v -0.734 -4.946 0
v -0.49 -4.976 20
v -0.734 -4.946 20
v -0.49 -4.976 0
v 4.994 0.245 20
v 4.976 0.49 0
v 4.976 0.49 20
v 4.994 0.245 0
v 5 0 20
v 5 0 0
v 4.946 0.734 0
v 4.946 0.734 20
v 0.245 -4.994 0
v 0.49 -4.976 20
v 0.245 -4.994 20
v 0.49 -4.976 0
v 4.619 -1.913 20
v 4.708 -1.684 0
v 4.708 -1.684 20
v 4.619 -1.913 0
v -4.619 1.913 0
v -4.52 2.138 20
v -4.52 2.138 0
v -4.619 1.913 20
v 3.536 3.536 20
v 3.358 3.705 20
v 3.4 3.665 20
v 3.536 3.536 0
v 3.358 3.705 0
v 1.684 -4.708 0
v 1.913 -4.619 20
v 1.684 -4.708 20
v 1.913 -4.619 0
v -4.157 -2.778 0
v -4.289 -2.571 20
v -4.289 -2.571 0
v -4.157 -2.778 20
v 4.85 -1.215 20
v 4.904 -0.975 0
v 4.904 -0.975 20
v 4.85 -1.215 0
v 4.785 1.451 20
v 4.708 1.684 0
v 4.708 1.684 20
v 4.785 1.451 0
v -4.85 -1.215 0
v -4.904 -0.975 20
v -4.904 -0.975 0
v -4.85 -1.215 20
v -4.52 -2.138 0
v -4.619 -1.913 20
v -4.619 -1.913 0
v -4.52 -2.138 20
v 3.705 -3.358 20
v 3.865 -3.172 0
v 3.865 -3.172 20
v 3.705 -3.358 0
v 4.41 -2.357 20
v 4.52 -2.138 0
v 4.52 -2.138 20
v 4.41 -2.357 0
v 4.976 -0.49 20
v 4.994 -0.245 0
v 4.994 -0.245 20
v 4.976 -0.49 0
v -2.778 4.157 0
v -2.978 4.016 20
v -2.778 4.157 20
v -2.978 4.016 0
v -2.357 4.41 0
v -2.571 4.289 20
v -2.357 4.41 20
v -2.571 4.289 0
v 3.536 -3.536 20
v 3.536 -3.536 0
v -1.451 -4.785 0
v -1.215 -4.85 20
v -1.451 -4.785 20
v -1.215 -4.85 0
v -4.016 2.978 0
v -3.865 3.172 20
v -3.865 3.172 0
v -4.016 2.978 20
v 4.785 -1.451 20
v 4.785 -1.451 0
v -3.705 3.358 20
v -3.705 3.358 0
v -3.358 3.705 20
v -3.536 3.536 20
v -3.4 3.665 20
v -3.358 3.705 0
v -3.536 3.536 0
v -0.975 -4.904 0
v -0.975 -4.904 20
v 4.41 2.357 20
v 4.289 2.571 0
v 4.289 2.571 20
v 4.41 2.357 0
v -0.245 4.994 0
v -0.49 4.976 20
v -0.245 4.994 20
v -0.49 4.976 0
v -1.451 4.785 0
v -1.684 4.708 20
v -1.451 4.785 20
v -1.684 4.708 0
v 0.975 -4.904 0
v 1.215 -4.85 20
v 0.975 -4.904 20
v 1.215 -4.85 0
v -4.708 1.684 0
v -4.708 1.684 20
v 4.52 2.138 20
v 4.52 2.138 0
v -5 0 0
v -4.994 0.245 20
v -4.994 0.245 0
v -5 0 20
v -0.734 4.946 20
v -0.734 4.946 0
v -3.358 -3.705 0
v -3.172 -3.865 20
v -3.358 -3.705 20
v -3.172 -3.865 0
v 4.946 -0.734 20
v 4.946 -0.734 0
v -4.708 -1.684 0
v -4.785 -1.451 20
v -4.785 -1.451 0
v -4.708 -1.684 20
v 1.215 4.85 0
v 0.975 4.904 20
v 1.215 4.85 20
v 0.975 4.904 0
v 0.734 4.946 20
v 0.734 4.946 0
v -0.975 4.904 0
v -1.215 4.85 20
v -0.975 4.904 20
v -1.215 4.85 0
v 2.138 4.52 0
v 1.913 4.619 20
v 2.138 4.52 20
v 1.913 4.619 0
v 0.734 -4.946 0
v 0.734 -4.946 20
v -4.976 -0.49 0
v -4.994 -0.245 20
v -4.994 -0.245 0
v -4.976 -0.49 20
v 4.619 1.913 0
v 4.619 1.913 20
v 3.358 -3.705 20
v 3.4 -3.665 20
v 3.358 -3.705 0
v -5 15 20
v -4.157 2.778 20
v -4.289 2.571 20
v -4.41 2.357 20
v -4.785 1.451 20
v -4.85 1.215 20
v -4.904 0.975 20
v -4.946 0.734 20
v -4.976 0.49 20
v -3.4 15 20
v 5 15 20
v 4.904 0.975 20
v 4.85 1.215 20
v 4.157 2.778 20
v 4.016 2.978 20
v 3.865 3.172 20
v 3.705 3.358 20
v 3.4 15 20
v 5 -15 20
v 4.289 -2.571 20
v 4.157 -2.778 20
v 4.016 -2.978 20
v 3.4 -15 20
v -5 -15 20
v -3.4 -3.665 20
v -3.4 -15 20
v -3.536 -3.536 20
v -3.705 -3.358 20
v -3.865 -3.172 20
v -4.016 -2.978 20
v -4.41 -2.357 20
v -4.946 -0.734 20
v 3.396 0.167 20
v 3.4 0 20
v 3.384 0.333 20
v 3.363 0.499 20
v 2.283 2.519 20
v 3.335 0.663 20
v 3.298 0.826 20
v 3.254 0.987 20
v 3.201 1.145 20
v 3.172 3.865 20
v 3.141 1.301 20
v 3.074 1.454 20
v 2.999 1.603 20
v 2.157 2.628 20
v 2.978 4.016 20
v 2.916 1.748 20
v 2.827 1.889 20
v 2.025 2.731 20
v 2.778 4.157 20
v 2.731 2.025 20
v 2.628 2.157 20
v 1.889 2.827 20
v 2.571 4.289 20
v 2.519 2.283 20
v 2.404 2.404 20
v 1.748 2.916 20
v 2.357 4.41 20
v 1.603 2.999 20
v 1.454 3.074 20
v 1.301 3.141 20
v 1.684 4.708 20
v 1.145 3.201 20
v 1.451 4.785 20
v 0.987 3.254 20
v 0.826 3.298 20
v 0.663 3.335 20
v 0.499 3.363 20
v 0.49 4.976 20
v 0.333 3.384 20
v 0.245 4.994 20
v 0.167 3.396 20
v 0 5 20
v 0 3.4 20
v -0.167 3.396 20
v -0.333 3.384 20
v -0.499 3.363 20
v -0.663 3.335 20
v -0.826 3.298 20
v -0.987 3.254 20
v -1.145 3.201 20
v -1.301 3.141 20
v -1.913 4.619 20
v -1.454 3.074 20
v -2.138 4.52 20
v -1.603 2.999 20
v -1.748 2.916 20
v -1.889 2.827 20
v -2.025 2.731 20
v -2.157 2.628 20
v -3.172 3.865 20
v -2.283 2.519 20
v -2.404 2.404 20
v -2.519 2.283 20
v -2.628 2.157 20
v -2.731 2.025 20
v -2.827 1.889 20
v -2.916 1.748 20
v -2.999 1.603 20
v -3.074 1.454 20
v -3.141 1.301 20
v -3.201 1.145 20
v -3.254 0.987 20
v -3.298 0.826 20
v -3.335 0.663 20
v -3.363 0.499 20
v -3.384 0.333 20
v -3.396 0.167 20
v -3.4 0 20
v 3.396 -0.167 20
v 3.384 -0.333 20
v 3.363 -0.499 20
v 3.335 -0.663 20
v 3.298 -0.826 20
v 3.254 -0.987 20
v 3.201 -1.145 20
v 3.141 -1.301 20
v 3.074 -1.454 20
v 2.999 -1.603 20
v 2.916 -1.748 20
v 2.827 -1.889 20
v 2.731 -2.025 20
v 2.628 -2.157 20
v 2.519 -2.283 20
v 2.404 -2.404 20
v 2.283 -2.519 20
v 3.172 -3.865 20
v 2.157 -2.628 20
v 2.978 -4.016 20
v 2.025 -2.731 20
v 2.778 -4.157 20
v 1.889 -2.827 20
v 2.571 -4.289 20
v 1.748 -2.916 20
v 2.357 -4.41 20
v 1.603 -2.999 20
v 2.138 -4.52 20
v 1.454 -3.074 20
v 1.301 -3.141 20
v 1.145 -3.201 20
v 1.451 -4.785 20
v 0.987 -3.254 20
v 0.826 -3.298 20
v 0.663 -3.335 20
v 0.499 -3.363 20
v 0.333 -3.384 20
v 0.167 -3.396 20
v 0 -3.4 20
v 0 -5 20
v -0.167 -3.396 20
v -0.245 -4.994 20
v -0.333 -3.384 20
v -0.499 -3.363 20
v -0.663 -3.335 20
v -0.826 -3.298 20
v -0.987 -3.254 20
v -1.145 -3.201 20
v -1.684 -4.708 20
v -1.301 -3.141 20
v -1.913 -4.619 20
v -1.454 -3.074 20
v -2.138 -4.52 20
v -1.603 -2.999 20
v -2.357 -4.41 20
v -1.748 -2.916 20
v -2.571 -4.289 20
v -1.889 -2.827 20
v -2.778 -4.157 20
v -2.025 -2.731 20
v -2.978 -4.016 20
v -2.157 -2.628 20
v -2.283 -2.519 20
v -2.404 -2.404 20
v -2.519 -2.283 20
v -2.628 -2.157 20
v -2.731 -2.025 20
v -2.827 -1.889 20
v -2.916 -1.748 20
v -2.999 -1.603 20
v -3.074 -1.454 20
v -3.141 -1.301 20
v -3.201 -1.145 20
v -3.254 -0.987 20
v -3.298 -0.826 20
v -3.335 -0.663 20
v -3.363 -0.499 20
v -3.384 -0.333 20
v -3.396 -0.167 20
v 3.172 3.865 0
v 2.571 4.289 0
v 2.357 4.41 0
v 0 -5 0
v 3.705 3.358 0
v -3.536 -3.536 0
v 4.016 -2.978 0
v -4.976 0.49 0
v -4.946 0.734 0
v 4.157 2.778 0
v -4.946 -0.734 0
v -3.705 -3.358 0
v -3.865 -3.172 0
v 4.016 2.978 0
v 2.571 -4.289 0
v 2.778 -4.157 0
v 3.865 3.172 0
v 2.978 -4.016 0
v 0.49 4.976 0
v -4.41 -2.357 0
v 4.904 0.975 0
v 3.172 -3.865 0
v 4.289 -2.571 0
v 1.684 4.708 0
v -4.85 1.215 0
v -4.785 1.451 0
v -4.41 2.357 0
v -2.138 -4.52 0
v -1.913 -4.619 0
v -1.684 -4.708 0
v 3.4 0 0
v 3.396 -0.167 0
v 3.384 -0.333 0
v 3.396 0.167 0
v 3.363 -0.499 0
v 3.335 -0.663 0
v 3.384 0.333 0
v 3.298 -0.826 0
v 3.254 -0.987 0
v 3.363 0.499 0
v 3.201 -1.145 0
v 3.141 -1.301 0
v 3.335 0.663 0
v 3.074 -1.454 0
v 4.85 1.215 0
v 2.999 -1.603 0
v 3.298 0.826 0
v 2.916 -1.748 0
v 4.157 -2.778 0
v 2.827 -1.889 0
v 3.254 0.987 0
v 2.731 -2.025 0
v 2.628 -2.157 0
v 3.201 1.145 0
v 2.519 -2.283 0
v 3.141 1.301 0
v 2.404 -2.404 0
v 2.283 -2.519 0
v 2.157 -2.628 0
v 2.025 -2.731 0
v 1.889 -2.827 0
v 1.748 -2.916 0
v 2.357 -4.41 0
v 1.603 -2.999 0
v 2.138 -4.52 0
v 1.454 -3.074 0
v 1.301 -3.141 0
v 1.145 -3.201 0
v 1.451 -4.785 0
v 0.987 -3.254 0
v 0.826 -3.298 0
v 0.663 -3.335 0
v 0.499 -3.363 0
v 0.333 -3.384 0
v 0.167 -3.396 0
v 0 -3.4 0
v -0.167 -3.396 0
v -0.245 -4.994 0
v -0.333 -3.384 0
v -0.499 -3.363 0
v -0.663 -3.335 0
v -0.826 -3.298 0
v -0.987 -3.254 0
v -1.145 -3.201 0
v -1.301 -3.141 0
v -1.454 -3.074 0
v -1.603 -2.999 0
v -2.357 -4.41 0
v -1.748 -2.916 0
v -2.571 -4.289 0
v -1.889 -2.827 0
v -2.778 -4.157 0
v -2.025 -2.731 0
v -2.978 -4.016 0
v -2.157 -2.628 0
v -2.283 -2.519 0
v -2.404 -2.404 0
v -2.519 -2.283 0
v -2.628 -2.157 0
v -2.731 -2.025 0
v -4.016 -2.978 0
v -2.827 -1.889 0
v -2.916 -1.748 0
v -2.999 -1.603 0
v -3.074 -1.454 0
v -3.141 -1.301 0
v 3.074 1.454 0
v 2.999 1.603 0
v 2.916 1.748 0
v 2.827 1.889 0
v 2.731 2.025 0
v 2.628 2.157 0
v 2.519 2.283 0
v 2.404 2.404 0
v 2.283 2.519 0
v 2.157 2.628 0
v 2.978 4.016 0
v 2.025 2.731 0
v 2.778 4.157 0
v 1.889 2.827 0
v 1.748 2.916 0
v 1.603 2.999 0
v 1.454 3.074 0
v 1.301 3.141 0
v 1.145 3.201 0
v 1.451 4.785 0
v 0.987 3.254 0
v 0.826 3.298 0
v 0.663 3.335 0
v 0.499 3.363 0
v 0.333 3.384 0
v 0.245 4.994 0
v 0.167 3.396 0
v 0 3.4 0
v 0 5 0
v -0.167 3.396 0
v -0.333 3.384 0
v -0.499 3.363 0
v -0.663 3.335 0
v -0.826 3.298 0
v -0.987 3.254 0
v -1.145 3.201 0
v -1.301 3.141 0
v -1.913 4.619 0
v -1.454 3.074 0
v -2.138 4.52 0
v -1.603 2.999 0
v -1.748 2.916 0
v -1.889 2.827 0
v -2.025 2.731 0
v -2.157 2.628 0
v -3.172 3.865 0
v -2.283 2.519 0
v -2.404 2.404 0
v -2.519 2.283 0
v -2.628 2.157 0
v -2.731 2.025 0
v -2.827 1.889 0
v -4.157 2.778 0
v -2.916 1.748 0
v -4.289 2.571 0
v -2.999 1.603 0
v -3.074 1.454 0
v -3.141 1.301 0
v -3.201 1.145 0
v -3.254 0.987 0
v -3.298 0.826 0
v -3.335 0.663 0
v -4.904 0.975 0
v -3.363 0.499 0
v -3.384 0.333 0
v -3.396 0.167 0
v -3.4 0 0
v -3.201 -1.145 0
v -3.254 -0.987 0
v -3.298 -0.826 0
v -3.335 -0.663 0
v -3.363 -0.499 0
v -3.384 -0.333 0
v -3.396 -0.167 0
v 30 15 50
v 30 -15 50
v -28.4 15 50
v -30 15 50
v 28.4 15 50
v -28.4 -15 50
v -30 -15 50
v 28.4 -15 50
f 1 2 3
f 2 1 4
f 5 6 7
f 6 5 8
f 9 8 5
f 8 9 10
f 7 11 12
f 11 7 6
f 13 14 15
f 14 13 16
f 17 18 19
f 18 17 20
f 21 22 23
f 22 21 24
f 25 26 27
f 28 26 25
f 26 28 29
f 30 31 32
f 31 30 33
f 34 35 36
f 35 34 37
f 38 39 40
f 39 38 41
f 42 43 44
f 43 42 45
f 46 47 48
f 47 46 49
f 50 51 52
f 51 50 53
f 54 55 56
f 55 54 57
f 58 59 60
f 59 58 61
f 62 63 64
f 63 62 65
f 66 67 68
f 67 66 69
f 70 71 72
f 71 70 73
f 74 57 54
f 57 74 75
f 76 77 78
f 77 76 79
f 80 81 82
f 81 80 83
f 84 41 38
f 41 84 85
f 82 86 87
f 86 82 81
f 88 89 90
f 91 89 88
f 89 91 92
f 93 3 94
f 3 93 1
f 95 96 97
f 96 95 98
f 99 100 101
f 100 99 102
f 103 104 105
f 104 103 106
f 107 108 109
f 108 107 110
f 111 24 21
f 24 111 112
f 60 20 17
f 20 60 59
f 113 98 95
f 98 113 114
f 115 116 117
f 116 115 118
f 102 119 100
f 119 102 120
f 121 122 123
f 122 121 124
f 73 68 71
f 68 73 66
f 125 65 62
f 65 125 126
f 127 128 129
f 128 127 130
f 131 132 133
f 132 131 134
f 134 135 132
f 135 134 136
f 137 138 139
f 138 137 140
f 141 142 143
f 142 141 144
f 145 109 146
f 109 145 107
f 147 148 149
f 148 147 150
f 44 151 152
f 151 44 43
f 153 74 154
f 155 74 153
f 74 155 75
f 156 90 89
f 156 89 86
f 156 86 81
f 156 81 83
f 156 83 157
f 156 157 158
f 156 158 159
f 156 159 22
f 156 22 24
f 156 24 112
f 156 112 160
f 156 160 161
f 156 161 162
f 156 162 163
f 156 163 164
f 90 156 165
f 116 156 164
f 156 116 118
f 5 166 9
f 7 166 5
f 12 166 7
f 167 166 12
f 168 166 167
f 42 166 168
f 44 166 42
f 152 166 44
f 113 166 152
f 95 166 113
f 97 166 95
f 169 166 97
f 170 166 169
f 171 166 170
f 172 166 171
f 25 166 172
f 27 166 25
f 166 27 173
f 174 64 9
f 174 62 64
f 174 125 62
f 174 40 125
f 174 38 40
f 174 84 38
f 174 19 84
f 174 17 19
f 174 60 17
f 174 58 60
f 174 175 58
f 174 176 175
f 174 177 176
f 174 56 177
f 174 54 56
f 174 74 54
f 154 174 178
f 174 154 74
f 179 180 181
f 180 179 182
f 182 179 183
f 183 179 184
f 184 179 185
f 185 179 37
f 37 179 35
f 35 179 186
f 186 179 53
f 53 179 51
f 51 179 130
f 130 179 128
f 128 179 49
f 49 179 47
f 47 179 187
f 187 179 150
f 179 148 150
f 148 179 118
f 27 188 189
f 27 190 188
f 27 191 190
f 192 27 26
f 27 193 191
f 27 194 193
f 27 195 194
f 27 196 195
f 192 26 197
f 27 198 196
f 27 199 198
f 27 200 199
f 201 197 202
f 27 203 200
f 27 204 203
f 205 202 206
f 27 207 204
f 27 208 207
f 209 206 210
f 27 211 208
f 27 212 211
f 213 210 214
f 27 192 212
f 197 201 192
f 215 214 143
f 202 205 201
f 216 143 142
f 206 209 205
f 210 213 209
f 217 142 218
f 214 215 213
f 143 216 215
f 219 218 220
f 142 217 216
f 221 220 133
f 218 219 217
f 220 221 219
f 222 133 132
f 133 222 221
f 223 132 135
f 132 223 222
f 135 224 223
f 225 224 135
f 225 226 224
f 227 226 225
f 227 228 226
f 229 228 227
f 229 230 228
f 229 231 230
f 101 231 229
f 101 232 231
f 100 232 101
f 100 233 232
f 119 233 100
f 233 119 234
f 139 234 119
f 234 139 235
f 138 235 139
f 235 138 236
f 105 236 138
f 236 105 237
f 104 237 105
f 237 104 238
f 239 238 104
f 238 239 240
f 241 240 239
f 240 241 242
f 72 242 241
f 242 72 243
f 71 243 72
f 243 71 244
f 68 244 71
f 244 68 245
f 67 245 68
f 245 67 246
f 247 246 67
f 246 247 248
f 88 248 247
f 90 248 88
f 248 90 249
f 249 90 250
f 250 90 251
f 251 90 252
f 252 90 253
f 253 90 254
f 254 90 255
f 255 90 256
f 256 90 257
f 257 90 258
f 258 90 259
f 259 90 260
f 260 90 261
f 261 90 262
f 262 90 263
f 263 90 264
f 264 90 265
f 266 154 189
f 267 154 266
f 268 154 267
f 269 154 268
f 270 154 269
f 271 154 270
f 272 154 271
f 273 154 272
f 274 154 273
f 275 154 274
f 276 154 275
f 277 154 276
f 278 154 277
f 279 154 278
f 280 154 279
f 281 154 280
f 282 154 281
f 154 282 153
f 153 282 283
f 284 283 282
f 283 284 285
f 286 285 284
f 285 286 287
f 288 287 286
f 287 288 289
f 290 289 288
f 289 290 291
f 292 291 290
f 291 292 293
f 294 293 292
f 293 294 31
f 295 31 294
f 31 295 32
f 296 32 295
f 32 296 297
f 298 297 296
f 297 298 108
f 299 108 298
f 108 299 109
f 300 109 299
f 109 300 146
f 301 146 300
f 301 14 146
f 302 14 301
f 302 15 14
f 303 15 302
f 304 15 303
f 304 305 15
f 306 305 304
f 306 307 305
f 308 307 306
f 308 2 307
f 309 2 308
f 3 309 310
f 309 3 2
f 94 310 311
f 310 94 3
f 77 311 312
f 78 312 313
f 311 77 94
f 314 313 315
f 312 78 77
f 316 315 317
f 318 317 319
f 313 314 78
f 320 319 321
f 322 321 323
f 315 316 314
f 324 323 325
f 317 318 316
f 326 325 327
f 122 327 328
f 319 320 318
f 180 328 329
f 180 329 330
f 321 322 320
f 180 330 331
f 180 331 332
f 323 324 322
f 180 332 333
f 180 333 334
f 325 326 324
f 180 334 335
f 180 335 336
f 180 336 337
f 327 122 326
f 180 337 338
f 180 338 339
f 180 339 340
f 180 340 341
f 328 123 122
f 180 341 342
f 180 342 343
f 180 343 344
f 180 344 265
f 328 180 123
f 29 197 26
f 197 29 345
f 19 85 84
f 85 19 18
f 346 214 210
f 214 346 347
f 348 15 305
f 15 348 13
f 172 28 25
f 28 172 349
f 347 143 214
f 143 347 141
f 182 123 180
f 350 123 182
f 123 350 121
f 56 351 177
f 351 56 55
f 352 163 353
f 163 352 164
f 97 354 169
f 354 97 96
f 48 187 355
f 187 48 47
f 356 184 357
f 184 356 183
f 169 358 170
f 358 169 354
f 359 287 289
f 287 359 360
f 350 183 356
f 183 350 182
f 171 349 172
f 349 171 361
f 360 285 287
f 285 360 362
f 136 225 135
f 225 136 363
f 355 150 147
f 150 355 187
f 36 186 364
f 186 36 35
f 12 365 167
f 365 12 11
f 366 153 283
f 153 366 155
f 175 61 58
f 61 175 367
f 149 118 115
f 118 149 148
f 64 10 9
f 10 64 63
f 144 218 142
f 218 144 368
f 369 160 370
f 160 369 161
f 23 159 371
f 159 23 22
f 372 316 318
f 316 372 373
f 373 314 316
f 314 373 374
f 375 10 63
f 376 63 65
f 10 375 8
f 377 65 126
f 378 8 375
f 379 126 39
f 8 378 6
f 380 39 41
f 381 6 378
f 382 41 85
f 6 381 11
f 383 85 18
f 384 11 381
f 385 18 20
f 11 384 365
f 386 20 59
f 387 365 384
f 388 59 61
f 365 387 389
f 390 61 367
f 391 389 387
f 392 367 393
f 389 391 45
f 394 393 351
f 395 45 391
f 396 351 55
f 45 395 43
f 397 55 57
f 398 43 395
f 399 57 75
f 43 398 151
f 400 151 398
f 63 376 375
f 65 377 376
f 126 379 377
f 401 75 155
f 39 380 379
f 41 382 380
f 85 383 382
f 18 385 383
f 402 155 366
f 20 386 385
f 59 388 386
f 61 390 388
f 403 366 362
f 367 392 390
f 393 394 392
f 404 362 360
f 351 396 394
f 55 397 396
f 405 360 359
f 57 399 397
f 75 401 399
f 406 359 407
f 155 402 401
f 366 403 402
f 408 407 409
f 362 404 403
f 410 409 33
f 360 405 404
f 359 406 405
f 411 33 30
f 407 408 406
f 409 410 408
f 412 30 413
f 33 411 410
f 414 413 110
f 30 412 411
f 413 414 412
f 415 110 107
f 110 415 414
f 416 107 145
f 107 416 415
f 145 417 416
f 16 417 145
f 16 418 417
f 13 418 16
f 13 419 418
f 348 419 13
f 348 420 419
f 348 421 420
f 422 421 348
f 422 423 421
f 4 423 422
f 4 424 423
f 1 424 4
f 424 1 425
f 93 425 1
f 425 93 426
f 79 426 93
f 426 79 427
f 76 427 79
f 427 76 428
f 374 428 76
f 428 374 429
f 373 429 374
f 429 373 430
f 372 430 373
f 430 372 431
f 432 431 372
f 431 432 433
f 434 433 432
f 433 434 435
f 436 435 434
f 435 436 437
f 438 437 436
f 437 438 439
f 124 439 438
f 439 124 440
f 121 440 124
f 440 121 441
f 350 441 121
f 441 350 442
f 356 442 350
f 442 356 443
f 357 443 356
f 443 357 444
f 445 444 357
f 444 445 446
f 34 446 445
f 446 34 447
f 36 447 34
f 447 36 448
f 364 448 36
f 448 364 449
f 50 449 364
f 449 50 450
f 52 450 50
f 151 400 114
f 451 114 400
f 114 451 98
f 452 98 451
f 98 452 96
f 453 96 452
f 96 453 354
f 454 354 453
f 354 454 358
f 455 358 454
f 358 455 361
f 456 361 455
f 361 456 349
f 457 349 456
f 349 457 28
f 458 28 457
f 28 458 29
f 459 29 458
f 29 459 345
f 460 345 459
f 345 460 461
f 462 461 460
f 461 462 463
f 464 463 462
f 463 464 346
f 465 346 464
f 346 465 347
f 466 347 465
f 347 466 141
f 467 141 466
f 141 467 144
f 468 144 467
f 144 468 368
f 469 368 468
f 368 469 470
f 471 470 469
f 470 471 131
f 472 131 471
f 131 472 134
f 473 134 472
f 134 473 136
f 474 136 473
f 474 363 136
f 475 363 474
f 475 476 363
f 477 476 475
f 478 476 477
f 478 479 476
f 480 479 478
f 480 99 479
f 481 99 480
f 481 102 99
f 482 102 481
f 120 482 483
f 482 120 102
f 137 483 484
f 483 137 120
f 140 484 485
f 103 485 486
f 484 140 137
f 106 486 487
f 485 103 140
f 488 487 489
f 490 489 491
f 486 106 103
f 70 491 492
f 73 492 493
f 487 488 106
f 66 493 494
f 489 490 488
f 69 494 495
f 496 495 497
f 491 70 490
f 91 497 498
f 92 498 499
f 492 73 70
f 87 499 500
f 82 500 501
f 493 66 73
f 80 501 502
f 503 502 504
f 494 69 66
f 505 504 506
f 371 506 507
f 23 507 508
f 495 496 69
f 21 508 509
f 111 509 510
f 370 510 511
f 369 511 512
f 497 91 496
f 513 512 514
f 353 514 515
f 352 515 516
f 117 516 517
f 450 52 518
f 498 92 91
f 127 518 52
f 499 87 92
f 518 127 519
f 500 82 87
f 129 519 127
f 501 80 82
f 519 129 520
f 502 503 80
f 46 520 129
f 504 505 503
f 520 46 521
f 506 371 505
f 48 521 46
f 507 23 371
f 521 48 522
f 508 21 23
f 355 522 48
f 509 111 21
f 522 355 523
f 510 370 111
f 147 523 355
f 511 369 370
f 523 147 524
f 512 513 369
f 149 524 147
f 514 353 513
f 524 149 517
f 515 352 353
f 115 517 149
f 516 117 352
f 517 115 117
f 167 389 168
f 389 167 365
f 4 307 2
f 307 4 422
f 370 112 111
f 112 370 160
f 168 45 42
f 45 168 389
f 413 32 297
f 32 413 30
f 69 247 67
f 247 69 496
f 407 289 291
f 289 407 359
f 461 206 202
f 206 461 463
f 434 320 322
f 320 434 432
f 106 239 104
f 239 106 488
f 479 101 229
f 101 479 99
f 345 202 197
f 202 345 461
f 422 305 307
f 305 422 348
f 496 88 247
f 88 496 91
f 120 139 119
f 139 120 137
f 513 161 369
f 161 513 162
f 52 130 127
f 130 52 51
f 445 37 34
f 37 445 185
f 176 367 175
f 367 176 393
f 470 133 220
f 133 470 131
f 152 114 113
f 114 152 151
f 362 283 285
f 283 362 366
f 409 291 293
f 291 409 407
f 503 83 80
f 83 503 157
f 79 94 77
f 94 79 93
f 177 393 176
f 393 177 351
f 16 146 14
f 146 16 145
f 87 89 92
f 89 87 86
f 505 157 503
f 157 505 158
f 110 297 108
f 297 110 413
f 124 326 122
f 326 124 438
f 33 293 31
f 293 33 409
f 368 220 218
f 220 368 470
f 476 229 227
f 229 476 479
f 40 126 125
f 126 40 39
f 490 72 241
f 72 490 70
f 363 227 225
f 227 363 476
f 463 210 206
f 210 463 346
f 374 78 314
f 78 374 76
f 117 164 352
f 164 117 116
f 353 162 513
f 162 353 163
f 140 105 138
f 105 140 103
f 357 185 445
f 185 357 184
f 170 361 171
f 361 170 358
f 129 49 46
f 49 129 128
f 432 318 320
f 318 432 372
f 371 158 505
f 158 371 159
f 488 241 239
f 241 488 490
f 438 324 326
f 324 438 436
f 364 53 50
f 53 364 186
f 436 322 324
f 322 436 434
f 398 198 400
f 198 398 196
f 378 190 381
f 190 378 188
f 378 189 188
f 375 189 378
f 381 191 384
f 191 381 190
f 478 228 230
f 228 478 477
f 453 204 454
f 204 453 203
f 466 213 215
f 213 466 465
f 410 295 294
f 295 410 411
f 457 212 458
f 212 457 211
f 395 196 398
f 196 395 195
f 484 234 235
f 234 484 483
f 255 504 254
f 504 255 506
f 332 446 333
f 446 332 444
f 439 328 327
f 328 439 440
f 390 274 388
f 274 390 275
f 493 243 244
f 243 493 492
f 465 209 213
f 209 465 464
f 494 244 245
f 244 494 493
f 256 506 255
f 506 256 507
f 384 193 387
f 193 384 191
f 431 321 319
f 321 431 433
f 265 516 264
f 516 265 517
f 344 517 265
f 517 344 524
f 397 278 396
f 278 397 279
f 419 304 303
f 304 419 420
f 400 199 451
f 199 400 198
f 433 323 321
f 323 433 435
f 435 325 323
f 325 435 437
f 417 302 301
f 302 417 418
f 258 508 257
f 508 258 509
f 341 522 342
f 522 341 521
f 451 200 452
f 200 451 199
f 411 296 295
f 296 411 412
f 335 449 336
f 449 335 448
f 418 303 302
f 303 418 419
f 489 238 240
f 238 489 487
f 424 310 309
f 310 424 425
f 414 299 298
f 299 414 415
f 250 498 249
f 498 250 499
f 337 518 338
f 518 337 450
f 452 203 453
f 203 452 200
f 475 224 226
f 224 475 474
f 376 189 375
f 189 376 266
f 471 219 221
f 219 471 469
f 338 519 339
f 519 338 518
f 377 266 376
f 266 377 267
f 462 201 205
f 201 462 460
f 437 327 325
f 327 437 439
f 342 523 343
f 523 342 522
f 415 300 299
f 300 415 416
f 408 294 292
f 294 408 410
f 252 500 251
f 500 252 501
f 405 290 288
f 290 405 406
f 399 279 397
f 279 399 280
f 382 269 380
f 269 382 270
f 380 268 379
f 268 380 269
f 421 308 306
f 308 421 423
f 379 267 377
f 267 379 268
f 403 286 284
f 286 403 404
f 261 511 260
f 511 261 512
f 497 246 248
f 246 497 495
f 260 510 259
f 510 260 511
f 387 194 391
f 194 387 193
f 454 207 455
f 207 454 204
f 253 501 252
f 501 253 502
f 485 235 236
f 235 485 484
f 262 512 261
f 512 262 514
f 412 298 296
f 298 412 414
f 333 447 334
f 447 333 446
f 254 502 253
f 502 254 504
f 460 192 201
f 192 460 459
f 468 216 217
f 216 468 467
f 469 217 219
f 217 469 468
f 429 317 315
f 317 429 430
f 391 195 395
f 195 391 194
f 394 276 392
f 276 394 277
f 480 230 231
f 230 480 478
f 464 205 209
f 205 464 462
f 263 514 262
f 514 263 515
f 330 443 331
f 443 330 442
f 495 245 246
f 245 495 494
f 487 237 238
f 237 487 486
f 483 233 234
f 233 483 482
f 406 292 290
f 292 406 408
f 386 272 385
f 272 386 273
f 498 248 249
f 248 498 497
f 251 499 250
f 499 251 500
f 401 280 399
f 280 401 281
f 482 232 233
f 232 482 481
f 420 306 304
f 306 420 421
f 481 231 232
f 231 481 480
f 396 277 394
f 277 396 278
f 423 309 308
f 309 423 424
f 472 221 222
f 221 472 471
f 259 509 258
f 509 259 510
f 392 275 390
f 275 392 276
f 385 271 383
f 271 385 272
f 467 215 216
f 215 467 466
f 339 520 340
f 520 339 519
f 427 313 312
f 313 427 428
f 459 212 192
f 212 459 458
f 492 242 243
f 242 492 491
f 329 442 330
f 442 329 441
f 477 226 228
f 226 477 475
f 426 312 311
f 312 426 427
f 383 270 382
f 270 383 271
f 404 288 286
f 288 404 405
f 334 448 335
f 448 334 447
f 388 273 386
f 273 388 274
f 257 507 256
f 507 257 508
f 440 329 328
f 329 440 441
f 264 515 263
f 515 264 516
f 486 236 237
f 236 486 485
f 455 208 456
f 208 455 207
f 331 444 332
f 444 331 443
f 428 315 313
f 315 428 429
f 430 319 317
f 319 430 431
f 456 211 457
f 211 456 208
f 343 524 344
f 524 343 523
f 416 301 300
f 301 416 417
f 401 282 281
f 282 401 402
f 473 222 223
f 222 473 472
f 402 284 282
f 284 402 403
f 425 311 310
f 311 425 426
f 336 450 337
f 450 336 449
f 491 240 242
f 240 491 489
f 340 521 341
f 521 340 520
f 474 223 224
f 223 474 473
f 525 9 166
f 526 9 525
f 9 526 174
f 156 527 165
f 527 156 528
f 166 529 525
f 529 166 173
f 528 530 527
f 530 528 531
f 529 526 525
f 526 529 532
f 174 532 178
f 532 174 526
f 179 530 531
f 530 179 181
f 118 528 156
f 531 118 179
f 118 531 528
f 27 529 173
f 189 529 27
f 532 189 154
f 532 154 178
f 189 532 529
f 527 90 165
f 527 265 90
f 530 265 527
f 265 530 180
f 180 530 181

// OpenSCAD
// Lab Funnel Design
// Units: millimetres
// Orientation: Upright, wide opening at top, rests on XY plane at z=0.

// --- Dimensions ---
// Spout (Tube)
$spout_outer_diameter = 10;
$spout_inner_diameter = 6.8; // 10 - 2*1.6
$spout_length = 20;

// Cone (Funnel)
$cone_bottom_diameter = 10;  // Matches spout outer diameter
$cone_top_diameter = 60;     // Rim diameter
$cone_height = 30;           // From z=20 to z=50

// Wall Thickness
$wall_thickness = 1.6;

// Resolution for curved surfaces
$fn = 128;

// --- Helper Functions ---
// Function to create a hollow cylinder (tube)
// Arguments: outer_d, inner_d, height, center_z
module hollow_cylinder(outer_d, inner_d, height, center_z) {
    translate([0, 0, center_z - height/2]) {
        difference() {
            cylinder(h = height, d = outer_d, $fn = $fn);
            cylinder(h = height, d = inner_d, $fn = $fn);
        }
    }
}

// Function to create a hollow cone
// Arguments: bottom_d, top_d, height, center_z
// The cone tapers from bottom_d at center_z - height/2 to top_d at center_z + height/2
module hollow_cone(bottom_d, top_d, height, center_z) {
    translate([0, 0, center_z - height/2]) {
        difference() {
            // Outer Cone
            // Using linear_extrude with a triangle profile
            // The triangle goes from -bottom_d/2 to -top_d/2 over the height
            // We need to rotate the profile 90 deg around X to stand up
            rotate([90, 0, 0]) {
                linear_extrude(height = height, center = true) {
                    polygon(points = [
                        [-bottom_d/2, 0],
                        [-top_d/2, height],
                        [top_d/2, height],
                        [bottom_d/2, 0]
                    ]);
                }
            }
            
            // Inner Cone (Hole)
            rotate([90, 0, 0]) {
                linear_extrude(height = height, center = true) {
                    polygon(points = [
                        [-bottom_d/2 + $wall_thickness, 0],
                        [-top_d/2 + $wall_thickness, height],
                        [top_d/2 - $wall_thickness, height],
                        [bottom_d/2 - $wall_thickness, 0]
                    ]);
                }
            }
        }
    }
}

// --- Main Assembly ---

// 1. Build the Spout (Tube)
// Located from z = 0 to z = 20. Centered at z = 10.
hollow_cylinder(
    outer_d = $spout_outer_diameter,
    inner_d = $spout_inner_diameter,
    height = $spout_length,
    center_z = $spout_length / 2
);

// 2. Build the Cone (Funnel)
// Located from z = 20 to z = 50. Centered at z = 35.
hollow_cone(
    bottom_d = $cone_bottom_diameter,
    top_d = $cone_top_diameter,
    height = $cone_height,
    center_z = $spout_length + ($cone_height / 2)
);
